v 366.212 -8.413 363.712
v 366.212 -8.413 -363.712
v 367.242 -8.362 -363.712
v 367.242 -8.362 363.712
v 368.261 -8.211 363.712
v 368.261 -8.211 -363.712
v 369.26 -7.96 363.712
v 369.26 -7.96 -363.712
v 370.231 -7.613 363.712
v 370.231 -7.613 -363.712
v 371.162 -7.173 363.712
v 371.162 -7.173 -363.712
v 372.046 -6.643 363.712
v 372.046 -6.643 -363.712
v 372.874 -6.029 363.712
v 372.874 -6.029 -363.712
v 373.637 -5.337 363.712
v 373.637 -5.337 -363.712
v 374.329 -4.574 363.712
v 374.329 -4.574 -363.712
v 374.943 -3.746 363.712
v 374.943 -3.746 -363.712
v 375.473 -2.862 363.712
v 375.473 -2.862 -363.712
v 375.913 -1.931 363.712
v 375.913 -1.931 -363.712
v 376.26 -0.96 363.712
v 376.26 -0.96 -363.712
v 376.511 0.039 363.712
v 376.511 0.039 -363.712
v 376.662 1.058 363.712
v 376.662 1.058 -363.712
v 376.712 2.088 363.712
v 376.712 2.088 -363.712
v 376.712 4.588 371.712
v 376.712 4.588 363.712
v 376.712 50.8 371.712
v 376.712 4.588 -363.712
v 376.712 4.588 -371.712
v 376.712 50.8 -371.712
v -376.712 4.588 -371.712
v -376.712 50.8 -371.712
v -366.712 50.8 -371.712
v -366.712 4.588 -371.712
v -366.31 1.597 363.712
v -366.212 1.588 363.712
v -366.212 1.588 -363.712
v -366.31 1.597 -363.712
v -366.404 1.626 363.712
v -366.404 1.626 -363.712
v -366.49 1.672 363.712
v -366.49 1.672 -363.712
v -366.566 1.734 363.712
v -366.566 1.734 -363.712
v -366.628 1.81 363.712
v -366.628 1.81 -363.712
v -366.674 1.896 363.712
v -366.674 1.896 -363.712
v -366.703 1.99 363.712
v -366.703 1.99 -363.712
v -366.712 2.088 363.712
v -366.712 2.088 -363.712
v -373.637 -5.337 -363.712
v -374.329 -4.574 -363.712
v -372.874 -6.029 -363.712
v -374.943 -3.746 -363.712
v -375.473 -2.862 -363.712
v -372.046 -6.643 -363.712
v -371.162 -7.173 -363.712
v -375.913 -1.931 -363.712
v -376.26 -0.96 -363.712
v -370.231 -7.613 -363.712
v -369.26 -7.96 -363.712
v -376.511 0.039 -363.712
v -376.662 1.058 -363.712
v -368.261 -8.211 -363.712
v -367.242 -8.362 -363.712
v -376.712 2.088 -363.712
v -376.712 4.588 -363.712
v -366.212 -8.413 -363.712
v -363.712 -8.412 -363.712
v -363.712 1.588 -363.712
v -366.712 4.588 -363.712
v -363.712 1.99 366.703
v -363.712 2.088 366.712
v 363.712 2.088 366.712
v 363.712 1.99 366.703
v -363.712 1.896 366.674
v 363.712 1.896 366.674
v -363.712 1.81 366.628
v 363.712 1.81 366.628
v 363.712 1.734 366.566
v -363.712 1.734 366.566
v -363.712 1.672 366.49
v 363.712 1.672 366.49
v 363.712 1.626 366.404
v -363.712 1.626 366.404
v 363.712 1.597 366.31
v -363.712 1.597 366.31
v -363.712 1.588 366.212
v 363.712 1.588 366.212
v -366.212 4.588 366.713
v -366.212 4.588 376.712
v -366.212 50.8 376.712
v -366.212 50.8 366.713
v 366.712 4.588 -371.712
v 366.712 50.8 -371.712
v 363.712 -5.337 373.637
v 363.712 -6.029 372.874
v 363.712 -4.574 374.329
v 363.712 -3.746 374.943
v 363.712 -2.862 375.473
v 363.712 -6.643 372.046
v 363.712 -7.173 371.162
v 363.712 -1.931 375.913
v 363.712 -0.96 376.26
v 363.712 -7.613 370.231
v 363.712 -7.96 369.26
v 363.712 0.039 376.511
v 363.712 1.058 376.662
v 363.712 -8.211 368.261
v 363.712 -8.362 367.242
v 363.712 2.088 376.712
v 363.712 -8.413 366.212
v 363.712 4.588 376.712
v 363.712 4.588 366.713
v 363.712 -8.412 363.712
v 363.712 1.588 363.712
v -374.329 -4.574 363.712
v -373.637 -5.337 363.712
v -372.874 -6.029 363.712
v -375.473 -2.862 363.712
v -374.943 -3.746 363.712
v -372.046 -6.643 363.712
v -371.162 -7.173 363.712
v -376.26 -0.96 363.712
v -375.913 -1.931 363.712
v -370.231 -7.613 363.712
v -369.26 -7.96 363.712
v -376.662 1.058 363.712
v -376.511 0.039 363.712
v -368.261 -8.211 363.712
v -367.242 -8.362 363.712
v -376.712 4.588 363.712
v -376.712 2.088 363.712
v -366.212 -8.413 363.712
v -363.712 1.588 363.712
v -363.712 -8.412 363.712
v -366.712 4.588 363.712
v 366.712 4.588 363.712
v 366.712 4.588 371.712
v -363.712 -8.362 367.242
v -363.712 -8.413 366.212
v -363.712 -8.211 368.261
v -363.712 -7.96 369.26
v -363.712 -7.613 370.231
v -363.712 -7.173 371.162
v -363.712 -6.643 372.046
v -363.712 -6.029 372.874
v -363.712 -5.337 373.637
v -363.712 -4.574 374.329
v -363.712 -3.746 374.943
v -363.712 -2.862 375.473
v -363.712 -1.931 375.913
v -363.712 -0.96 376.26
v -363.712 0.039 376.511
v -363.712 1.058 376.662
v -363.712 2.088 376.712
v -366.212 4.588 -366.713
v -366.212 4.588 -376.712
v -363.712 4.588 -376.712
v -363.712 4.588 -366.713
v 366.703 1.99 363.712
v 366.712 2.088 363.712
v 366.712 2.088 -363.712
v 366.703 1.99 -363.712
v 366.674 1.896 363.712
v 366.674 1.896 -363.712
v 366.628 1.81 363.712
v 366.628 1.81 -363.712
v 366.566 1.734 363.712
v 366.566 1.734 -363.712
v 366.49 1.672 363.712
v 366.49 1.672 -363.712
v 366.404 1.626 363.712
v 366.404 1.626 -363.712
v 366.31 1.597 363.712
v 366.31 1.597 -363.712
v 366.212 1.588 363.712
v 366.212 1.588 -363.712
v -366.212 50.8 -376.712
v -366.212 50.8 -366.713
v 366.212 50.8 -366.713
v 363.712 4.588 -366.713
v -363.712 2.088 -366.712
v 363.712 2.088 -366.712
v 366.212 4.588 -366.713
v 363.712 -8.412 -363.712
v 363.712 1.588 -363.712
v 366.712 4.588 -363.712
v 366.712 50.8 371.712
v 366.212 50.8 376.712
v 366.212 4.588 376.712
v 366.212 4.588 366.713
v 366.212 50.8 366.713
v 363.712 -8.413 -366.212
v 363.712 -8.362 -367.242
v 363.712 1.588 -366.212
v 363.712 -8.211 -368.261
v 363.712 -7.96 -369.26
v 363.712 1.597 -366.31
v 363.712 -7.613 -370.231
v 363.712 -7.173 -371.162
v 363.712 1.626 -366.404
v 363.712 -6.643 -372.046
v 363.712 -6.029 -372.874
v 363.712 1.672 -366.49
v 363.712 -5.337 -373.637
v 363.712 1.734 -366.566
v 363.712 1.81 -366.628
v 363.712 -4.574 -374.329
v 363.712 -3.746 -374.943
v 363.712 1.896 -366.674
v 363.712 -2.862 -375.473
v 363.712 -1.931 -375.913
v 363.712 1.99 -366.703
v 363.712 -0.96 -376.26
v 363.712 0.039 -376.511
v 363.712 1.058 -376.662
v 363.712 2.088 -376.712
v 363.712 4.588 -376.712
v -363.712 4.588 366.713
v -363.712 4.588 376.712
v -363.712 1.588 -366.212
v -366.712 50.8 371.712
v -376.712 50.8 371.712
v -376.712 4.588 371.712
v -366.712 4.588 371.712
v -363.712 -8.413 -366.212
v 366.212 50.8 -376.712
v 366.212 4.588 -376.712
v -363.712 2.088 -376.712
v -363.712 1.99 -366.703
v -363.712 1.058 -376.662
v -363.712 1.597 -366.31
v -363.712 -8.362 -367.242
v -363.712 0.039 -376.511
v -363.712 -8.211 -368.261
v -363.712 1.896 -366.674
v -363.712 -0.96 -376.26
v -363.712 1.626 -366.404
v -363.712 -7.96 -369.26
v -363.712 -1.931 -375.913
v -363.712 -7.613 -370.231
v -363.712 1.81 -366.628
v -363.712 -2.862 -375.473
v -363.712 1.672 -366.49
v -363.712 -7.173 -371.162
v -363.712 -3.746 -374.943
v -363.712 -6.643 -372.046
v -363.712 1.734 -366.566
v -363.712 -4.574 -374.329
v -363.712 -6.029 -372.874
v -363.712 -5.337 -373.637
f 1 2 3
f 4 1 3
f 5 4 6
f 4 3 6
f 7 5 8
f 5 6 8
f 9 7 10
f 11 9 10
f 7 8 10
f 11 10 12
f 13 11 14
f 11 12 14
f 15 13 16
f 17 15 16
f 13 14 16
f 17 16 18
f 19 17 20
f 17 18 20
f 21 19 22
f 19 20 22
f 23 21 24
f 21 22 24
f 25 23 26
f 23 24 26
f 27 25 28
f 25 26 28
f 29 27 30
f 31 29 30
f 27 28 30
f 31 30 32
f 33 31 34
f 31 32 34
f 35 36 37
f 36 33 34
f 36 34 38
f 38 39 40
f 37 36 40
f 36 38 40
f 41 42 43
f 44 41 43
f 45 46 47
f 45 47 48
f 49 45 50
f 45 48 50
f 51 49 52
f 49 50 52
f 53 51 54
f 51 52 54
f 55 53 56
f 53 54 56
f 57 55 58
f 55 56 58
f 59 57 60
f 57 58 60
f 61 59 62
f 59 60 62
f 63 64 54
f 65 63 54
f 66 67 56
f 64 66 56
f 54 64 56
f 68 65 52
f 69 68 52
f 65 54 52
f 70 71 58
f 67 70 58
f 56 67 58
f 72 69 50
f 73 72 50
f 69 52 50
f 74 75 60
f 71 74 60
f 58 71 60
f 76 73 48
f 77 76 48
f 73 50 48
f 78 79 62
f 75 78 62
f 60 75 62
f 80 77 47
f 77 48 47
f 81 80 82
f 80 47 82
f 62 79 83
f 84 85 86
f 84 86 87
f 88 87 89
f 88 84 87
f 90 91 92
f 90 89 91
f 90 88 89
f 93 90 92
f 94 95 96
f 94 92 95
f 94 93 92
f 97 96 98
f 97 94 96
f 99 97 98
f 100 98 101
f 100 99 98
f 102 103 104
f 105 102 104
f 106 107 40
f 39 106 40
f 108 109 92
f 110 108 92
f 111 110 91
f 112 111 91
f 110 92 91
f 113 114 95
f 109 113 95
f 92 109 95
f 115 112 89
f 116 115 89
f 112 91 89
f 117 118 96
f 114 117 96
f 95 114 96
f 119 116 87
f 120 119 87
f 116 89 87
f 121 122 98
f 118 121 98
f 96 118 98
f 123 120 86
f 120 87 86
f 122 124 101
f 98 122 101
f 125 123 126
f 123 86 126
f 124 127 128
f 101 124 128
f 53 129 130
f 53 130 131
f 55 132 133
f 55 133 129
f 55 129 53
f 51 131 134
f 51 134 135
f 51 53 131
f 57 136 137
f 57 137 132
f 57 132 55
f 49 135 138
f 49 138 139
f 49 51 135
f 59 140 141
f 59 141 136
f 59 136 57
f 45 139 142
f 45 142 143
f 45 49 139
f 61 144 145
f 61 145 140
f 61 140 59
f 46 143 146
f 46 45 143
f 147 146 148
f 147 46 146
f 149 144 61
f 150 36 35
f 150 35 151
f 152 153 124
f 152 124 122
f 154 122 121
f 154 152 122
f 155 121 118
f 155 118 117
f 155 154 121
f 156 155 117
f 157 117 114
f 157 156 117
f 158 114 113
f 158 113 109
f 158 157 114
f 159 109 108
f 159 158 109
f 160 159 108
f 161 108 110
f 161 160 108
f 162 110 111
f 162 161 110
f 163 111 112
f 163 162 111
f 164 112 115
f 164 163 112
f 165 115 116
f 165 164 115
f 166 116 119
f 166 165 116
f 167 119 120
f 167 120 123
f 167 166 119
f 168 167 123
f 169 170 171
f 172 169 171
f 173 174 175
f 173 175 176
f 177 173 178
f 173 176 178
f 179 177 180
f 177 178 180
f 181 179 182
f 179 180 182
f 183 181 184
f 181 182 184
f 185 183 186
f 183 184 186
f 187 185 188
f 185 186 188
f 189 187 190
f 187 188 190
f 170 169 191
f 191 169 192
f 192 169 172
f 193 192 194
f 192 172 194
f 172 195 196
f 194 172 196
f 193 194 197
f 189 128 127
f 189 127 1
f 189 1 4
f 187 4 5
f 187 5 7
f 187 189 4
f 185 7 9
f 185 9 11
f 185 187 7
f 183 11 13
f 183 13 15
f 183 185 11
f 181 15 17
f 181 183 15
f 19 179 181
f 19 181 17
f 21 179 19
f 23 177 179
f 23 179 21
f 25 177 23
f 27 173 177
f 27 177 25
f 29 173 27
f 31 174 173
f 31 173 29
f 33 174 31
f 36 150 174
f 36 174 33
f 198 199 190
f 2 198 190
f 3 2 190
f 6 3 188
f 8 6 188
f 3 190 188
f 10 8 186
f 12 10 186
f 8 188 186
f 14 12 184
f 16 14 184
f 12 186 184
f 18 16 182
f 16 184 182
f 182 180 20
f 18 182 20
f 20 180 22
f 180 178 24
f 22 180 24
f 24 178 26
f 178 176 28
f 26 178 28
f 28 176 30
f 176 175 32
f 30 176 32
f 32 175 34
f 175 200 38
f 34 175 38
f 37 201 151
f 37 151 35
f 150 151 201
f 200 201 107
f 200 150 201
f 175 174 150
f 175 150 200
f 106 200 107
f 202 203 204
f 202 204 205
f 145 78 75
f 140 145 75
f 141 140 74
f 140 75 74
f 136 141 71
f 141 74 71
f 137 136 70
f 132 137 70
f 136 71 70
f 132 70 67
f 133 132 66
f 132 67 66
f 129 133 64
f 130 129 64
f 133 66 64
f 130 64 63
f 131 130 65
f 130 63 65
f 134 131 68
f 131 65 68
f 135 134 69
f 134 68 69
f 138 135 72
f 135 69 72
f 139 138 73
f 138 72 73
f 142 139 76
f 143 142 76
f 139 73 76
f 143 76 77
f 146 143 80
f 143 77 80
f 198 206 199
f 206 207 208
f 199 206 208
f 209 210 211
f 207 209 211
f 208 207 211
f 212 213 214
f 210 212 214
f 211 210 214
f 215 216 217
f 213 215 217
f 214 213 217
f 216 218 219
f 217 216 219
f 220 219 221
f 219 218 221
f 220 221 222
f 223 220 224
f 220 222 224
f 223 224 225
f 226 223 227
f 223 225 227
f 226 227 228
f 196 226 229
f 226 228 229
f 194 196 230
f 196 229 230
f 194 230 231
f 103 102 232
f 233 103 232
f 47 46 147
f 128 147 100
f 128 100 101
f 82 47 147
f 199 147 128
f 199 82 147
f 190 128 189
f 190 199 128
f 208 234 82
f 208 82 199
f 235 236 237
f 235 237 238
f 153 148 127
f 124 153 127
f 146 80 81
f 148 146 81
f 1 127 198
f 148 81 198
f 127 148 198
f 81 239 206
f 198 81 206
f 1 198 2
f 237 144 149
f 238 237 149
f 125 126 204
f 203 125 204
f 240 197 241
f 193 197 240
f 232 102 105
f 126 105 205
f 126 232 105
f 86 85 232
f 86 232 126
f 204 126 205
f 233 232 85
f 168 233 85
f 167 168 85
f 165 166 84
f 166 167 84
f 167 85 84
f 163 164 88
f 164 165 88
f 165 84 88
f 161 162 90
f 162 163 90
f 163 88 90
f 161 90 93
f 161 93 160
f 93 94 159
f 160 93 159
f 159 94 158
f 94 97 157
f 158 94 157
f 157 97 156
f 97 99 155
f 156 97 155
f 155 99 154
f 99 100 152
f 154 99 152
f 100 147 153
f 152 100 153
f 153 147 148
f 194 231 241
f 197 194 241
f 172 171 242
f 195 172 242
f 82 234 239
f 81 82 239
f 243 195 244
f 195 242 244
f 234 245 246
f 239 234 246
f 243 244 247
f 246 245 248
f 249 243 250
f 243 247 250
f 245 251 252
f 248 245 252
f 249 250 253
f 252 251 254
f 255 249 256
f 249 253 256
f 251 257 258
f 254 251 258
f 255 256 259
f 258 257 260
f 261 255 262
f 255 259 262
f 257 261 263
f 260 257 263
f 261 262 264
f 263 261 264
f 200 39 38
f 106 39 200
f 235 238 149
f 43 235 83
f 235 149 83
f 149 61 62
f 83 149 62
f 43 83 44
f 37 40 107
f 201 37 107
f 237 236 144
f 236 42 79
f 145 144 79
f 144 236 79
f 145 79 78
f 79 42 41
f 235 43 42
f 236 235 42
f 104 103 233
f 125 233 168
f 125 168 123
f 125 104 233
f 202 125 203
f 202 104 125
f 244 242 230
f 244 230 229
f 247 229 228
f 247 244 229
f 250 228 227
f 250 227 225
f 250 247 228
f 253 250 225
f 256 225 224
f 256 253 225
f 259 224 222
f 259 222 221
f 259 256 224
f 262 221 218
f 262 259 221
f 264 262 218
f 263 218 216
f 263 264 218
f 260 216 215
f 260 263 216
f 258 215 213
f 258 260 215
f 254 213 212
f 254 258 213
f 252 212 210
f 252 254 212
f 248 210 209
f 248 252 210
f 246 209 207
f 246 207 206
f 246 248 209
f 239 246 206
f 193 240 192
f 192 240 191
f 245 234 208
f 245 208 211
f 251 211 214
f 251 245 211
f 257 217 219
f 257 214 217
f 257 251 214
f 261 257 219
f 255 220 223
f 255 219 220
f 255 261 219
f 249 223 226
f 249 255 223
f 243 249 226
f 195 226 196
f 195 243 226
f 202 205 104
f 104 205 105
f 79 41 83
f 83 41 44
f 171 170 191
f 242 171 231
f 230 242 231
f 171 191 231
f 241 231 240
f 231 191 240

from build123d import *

# Parameters (mm, degrees)
SKETCH1_W                    = 736.6
SKETCH1_H                    = 736.6
BOSS_EXTRUDE1_DEPTH          = 50.8
SHELL1_T                     = -1.5875
CONVERT_SOLID1_START         = -368.3
CONVERT_SOLID1_DEPTH         = 4.587500016
CONVERT_SOLID1_START_2       = 363.712499984
CONVERT_SOLID1_2_DEPTH       = 4.587500016
CONVERT_SOLID1_START_3       = -363.712499984
CONVERT_SOLID1_3_DEPTH       = 727.424999968
CONVERT_SOLID1_START_4       = -376.7125
CONVERT_SOLID1_4_DEPTH       = 10.500000016
CONVERT_SOLID1_START_5       = 366.212499984
CONVERT_SOLID1_5_DEPTH       = 10.500000016
CONVERT_SOLID1_START_6       = -371.7125
CONVERT_SOLID1_6_OUTLINE_W   = 727.424999968
CONVERT_SOLID1_6_OUTLINE_H   = 8.4125
CONVERT_SOLID1_6_OUTLINE_W_2 = 10
CONVERT_SOLID1_6_OUTLINE_H_2 = 46.212499984
CONVERT_SOLID1_6_DEPTH       = 743.425
CONVERT_SOLID1_START_7       = -366.2125
CONVERT_SOLID1_7_DEPTH       = 732.425
CONVERT_SOLID1_START_8       = -366.7125
CONVERT_SOLID1_8_OUTLINE_W   = 49.2125
CONVERT_SOLID1_8_OUTLINE_H   = 1.5875
CONVERT_SOLID1_8_DEPTH       = 0.5
CONVERT_SOLID1_START_9       = 366.2125
CONVERT_SOLID1_9_OUTLINE_W   = 49.2125
CONVERT_SOLID1_9_OUTLINE_H   = 1.5875
CONVERT_SOLID1_9_DEPTH       = 0.5
CONVERT_SOLID1_10_OUTLINE_W  = 3.000000016
CONVERT_SOLID1_10_OUTLINE_H  = 1.5875
CONVERT_SOLID1_10_DEPTH      = 2.500000016
CONVERT_SOLID1_11_OUTLINE_W  = 3.000000016
CONVERT_SOLID1_11_OUTLINE_H  = 1.5875
CONVERT_SOLID1_11_DEPTH      = 2.500000016


with BuildPart() as part:
    # Sketch1 → Boss-Extrude1 (new body)
    with BuildSketch(Plane(origin=(0, 0, 0), x_dir=(1, 0, 0), z_dir=(0, 1, 0))):
        Rectangle(SKETCH1_W, SKETCH1_H)
    extrude(amount=BOSS_EXTRUDE1_DEPTH)

    # Shell1
    shell1_openings = [part.faces().sort_by_distance(p)[0] for p in [
        (0, 50.8, 0),
    ]]
    offset(amount=SHELL1_T, openings=shell1_openings, kind=Kind.INTERSECTION)

    # Convert-Solid1: read off the stored shape, not the designer's step
    # Convert-Solid1 outline → Convert-Solid1 (cut)
    with BuildSketch(Plane.XY.offset(CONVERT_SOLID1_START)):
        with BuildLine():
            Line((366.212499984, 1.5875), (363.712499984, 1.5875))
            Line((363.712499984, 1.5875), (363.712499984, 0))
            Line((363.712499984, 0), (368.3, 0))
            Line((368.3, 0), (368.3, 4.587500016))
            Line((368.3, 4.587500016), (366.7125, 4.587500016))
            Line((366.7125, 4.587500016), (366.7125, 2.087500016))
            ThreePointArc((366.7125, 2.087500016), (366.566053386, 1.733946614), (366.212499984, 1.5875))
        make_face()
        with BuildLine():
            Line((-363.712499984, 0), (-363.712499984, 1.5875))
            Line((-363.712499984, 1.5875), (-366.212499984, 1.5875))
            ThreePointArc((-366.212499984, 1.5875), (-366.566053386, 1.733946614), (-366.7125, 2.087500016))
            Line((-366.7125, 2.087500016), (-366.7125, 4.587500016))
            Line((-366.7125, 4.587500016), (-368.3, 4.587500016))
            Line((-368.3, 4.587500016), (-368.3, 0))
            Line((-368.3, 0), (-363.712499984, 0))
        make_face()
    extrude(amount=CONVERT_SOLID1_DEPTH, mode=Mode.SUBTRACT)

    # Convert-Solid1 2 outline → Convert-Solid1 2 (cut)
    with BuildSketch(Plane.XY.offset(CONVERT_SOLID1_START_2)):
        with BuildLine():
            Line((366.212499984, 1.5875), (363.712499984, 1.5875))
            Line((363.712499984, 1.5875), (363.712499984, 0))
            Line((363.712499984, 0), (368.3, 0))
            Line((368.3, 0), (368.3, 4.587500016))
            Line((368.3, 4.587500016), (366.7125, 4.587500016))
            Line((366.7125, 4.587500016), (366.7125, 2.087500016))
            ThreePointArc((366.7125, 2.087500016), (366.566053386, 1.733946614), (366.212499984, 1.5875))
        make_face()
        with BuildLine():
            Line((-363.712499984, 0), (-363.712499984, 1.5875))
            Line((-363.712499984, 1.5875), (-366.212499984, 1.5875))
            ThreePointArc((-366.212499984, 1.5875), (-366.566053386, 1.733946614), (-366.7125, 2.087500016))
            Line((-366.7125, 2.087500016), (-366.7125, 4.587500016))
            Line((-366.7125, 4.587500016), (-368.3, 4.587500016))
            Line((-368.3, 4.587500016), (-368.3, 0))
            Line((-368.3, 0), (-363.712499984, 0))
        make_face()
    extrude(amount=CONVERT_SOLID1_2_DEPTH, mode=Mode.SUBTRACT)

    # Convert-Solid1 3 outline → Convert-Solid1 3 (add)
    with BuildSketch(Plane.XY.offset(CONVERT_SOLID1_START_3)):
        with BuildLine():
            Line((368.3, 0), (-368.3, 0))
            Line((-368.3, 0), (-368.3, 50.8))
            Line((-368.3, 50.8), (-376.7125, 50.8))
            Line((-376.7125, 50.8), (-376.7125, 2.087500016))
            ThreePointArc((-376.7125, 2.087500016), (-373.637121198, -5.337121198), (-366.212499984, -8.4125))
            Line((-366.212499984, -8.4125), (366.212499984, -8.4125))
            ThreePointArc((366.212499984, -8.4125), (373.637121198, -5.337121198), (376.7125, 2.087500016))
            Line((376.7125, 2.087500016), (376.7125, 50.8))
            Line((376.7125, 50.8), (368.3, 50.8))
            Line((368.3, 50.8), (368.3, 0))
        make_face()
        with BuildLine():
            ThreePointArc((366.7125, 2.087500016), (366.566053386, 1.733946614), (366.212499984, 1.5875))
            Line((366.212499984, 1.5875), (366.7125, 1.5875))
            Line((366.7125, 1.5875), (366.7125, 2.087500016))
        make_face()
        with BuildLine():
            Line((-366.7125, 1.5875), (-366.212499984, 1.5875))
            ThreePointArc((-366.212499984, 1.5875), (-366.566053386, 1.733946614), (-366.7125, 2.087500016))
            Line((-366.7125, 2.087500016), (-366.7125, 1.5875))
        make_face()
    extrude(amount=CONVERT_SOLID1_3_DEPTH)

    # Convert-Solid1 4 outline → Convert-Solid1 4 (add)
    with BuildSketch(Plane.XY.offset(CONVERT_SOLID1_START_4)):
        Polygon((-363.712499984, -8.4125), (363.712499984, -8.4125), (363.712499984, 4.587500016), (366.2125, 4.587500016), (366.2125, 50.8), (-366.2125, 50.8), (-366.2125, 4.587500016), (-363.712499984, 4.587500016), align=None)
    extrude(amount=CONVERT_SOLID1_4_DEPTH)

    # Convert-Solid1 5 outline → Convert-Solid1 5 (add)
    with BuildSketch(Plane.XY.offset(CONVERT_SOLID1_START_5)):
        Polygon((-363.712499984, -8.4125), (363.712499984, -8.4125), (363.712499984, 4.587500016), (366.2125, 4.587500016), (366.2125, 50.8), (-366.2125, 50.8), (-366.2125, 4.587500016), (-363.712499984, 4.587500016), align=None)
    extrude(amount=CONVERT_SOLID1_5_DEPTH)

    # Convert-Solid1 6 outline → Convert-Solid1 6 (add)
    with BuildSketch(Plane.XY.offset(CONVERT_SOLID1_START_6)):
        with Locations((0, -4.20625)):
            Rectangle(CONVERT_SOLID1_6_OUTLINE_W, CONVERT_SOLID1_6_OUTLINE_H)
        with Locations((371.7125, 27.693750008)):
            Rectangle(CONVERT_SOLID1_6_OUTLINE_W_2, CONVERT_SOLID1_6_OUTLINE_H_2)
        with Locations((-371.7125, 27.693750008)):
            Rectangle(CONVERT_SOLID1_6_OUTLINE_W_2, CONVERT_SOLID1_6_OUTLINE_H_2)
    extrude(amount=CONVERT_SOLID1_6_DEPTH)

    # Convert-Solid1 7 outline → Convert-Solid1 7 (cut)
    with BuildSketch(Plane.YZ.offset(CONVERT_SOLID1_START_7)):
        with BuildLine():
            Line((50.8, -366.212499984), (1.5875, -366.212499984))
            ThreePointArc((1.5875, -366.212499984), (1.733946614, -366.566053386), (2.087500016, -366.7125))
            Line((2.087500016, -366.7125), (50.8, -366.7125))
            Line((50.8, -366.7125), (50.8, -366.212499984))
        make_face()
        with BuildLine():
            Line((50.8, 366.212499984), (50.8, 366.7125))
            Line((50.8, 366.7125), (2.087500016, 366.7125))
            ThreePointArc((2.087500016, 366.7125), (1.733946614, 366.566053386), (1.5875, 366.212499984))
            Line((1.5875, 366.212499984), (50.8, 366.212499984))
        make_face()
        with BuildLine():
            Line((-8.4125, -376.7125), (2.087500016, -376.7125))
            ThreePointArc((2.087500016, -376.7125), (-5.337121198, -373.637121198), (-8.4125, -366.212499984))
            Line((-8.4125, -366.212499984), (-8.4125, -376.7125))
        make_face()
        with BuildLine():
            Line((-8.4125, 376.7125), (-8.4125, 366.212499984))
            ThreePointArc((-8.4125, 366.212499984), (-5.337121198, 373.637121198), (2.087500016, 376.7125))
            Line((2.087500016, 376.7125), (-8.4125, 376.7125))
        make_face()
    extrude(amount=CONVERT_SOLID1_7_DEPTH, mode=Mode.SUBTRACT)

    # Convert-Solid1 8 outline → Convert-Solid1 8 (cut)
    with BuildSketch(Plane.YZ.offset(CONVERT_SOLID1_START_8)):
        with Locations((26.19375, -367.50625)):
            Rectangle(CONVERT_SOLID1_8_OUTLINE_W, CONVERT_SOLID1_8_OUTLINE_H)
        with Locations((26.19375, 367.50625)):
            Rectangle(CONVERT_SOLID1_8_OUTLINE_W, CONVERT_SOLID1_8_OUTLINE_H)
    extrude(amount=CONVERT_SOLID1_8_DEPTH, mode=Mode.SUBTRACT)

    # Convert-Solid1 9 outline → Convert-Solid1 9 (cut)
    with BuildSketch(Plane.YZ.offset(CONVERT_SOLID1_START_9)):
        with Locations((26.19375, -367.50625)):
            Rectangle(CONVERT_SOLID1_9_OUTLINE_W, CONVERT_SOLID1_9_OUTLINE_H)
        with Locations((26.19375, 367.50625)):
            Rectangle(CONVERT_SOLID1_9_OUTLINE_W, CONVERT_SOLID1_9_OUTLINE_H)
    extrude(amount=CONVERT_SOLID1_9_DEPTH, mode=Mode.SUBTRACT)

    # Convert-Solid1 10 outline → Convert-Solid1 10 (cut)
    with BuildSketch(Plane.YZ.offset(CONVERT_SOLID1_START_7)):
        with Locations((3.087500008, -367.50625)):
            Rectangle(CONVERT_SOLID1_10_OUTLINE_W, CONVERT_SOLID1_10_OUTLINE_H)
        with Locations((3.087500008, 367.50625)):
            Rectangle(CONVERT_SOLID1_10_OUTLINE_W, CONVERT_SOLID1_10_OUTLINE_H)
    extrude(amount=CONVERT_SOLID1_10_DEPTH, mode=Mode.SUBTRACT)

    # Convert-Solid1 11 outline → Convert-Solid1 11 (cut)
    with BuildSketch(Plane.YZ.offset(CONVERT_SOLID1_START_2)):
        with Locations((3.087500008, -367.50625)):
            Rectangle(CONVERT_SOLID1_11_OUTLINE_W, CONVERT_SOLID1_11_OUTLINE_H)
        with Locations((3.087500008, 367.50625)):
            Rectangle(CONVERT_SOLID1_11_OUTLINE_W, CONVERT_SOLID1_11_OUTLINE_H)
    extrude(amount=CONVERT_SOLID1_11_DEPTH, mode=Mode.SUBTRACT)


solid = part.part
